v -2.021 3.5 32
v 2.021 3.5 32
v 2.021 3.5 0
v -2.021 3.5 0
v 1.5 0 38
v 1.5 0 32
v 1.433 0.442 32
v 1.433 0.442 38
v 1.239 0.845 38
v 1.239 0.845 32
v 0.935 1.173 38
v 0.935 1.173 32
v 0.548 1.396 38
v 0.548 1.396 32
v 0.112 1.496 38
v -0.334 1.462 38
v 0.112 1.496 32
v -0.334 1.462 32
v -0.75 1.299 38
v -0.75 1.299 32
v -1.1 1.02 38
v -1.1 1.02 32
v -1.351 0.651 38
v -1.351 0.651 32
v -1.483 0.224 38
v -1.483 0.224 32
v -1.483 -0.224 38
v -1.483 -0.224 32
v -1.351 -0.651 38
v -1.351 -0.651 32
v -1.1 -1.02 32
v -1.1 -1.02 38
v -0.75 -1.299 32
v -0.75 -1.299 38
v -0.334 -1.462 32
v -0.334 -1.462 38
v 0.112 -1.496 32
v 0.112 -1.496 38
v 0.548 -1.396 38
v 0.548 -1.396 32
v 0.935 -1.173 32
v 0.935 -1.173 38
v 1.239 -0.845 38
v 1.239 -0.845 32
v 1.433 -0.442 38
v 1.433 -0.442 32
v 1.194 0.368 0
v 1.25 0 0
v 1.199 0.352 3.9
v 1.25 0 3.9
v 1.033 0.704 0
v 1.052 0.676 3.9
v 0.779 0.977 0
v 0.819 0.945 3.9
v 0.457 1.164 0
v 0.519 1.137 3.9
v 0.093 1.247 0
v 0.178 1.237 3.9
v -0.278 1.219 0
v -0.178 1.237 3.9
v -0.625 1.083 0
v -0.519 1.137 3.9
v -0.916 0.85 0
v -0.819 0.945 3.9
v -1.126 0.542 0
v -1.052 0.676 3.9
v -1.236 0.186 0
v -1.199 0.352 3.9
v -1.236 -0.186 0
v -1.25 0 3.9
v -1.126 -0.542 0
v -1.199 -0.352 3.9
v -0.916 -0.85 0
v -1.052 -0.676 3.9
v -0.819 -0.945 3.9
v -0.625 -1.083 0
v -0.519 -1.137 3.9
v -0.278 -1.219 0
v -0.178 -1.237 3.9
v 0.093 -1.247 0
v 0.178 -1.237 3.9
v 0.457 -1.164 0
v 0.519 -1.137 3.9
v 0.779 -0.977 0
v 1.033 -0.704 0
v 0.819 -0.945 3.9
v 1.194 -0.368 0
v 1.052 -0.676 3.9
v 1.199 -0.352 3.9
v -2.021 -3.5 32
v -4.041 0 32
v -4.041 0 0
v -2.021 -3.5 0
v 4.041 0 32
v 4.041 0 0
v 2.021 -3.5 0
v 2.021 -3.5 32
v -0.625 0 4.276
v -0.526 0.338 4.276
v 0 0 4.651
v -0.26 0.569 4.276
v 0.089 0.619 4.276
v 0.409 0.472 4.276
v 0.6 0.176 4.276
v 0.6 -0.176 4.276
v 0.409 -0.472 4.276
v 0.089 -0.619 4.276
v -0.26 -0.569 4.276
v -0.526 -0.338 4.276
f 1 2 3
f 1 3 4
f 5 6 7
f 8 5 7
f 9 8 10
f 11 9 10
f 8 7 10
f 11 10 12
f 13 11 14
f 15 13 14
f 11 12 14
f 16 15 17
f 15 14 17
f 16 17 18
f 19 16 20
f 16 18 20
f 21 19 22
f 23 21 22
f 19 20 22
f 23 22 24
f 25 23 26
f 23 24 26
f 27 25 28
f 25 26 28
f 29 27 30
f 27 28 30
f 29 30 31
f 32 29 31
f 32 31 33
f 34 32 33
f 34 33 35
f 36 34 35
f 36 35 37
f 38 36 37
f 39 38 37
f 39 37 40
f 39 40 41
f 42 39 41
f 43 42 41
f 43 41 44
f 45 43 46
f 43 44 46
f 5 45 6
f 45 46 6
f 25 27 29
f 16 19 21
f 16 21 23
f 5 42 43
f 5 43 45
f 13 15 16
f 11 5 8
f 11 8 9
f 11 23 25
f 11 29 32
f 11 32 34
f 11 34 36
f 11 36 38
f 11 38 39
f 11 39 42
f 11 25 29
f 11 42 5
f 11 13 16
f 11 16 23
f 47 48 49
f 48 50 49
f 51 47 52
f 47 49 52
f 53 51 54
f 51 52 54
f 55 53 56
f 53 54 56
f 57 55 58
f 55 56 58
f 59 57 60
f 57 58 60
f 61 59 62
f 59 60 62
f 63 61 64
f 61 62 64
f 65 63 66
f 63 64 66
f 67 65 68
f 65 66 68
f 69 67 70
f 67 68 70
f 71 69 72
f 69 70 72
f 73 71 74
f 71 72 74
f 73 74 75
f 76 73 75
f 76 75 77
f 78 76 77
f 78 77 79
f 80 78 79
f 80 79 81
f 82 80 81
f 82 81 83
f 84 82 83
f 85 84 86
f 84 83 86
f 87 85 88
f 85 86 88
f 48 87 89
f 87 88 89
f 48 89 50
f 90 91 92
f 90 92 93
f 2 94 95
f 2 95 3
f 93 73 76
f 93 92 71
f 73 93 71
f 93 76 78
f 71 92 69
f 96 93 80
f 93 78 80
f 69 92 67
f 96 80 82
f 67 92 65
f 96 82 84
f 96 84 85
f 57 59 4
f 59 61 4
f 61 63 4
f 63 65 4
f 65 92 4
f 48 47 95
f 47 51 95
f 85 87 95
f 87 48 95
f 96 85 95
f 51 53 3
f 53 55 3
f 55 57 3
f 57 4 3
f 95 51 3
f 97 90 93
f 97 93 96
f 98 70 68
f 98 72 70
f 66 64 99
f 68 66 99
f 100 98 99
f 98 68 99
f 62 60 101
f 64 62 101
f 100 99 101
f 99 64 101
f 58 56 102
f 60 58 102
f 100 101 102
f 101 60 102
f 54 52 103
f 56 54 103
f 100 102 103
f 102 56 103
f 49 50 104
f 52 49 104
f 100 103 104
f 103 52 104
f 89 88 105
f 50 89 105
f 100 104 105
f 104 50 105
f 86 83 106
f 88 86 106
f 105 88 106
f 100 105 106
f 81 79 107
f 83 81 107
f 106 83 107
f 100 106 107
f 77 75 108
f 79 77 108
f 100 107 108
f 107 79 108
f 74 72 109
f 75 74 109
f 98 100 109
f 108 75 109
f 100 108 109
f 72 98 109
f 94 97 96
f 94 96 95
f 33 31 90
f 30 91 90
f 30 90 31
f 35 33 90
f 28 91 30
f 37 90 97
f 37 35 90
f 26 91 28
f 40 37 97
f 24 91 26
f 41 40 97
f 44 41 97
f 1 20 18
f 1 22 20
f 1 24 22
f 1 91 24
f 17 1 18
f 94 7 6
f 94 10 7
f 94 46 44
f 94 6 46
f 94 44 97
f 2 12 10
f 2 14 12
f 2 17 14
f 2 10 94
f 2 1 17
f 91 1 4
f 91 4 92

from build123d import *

# Parameters (mm, degrees)
EXTRUDE_1_DEPTH        = 32
SKETCH_2_R             = 1.5
EXTRUDE_2_DEPTH        = 6
HOLE_WIZARD_M3_1_D     = 2.5
HOLE_WIZARD_M3_1_DEPTH = 3.9
HOLE_WIZARD_M3_1_TIP   = 0.751075774


with BuildPart() as part:
    # 草图1 → 凸台-拉伸1 (new body)
    with BuildSketch(Plane.XY):
        Polygon((4.041451884, 0), (2.020725942, 3.5), (-2.020725942, 3.5), (-4.041451884, 0), (-2.020725942, -3.5), (2.020725942, -3.5), align=None)
    extrude(amount=EXTRUDE_1_DEPTH)

    # 草图2 → 凸台-拉伸2 (add)
    with BuildSketch(Plane.XY.offset(32)):
        Circle(SKETCH_2_R)
    extrude(amount=EXTRUDE_2_DEPTH)

    # M3 螺纹孔1
    with Locations(Plane(origin=(0, 0, 0), x_dir=(-1, 0, 0), z_dir=(0, 0, -1))):
        with Locations((0, 0)):
            Hole(HOLE_WIZARD_M3_1_D / 2, depth=HOLE_WIZARD_M3_1_DEPTH)
            with Locations((0, 0, -(HOLE_WIZARD_M3_1_DEPTH + HOLE_WIZARD_M3_1_TIP / 2))):  # 118° drill point
                Cone(0, HOLE_WIZARD_M3_1_D / 2, HOLE_WIZARD_M3_1_TIP, mode=Mode.SUBTRACT)


solid = part.part
